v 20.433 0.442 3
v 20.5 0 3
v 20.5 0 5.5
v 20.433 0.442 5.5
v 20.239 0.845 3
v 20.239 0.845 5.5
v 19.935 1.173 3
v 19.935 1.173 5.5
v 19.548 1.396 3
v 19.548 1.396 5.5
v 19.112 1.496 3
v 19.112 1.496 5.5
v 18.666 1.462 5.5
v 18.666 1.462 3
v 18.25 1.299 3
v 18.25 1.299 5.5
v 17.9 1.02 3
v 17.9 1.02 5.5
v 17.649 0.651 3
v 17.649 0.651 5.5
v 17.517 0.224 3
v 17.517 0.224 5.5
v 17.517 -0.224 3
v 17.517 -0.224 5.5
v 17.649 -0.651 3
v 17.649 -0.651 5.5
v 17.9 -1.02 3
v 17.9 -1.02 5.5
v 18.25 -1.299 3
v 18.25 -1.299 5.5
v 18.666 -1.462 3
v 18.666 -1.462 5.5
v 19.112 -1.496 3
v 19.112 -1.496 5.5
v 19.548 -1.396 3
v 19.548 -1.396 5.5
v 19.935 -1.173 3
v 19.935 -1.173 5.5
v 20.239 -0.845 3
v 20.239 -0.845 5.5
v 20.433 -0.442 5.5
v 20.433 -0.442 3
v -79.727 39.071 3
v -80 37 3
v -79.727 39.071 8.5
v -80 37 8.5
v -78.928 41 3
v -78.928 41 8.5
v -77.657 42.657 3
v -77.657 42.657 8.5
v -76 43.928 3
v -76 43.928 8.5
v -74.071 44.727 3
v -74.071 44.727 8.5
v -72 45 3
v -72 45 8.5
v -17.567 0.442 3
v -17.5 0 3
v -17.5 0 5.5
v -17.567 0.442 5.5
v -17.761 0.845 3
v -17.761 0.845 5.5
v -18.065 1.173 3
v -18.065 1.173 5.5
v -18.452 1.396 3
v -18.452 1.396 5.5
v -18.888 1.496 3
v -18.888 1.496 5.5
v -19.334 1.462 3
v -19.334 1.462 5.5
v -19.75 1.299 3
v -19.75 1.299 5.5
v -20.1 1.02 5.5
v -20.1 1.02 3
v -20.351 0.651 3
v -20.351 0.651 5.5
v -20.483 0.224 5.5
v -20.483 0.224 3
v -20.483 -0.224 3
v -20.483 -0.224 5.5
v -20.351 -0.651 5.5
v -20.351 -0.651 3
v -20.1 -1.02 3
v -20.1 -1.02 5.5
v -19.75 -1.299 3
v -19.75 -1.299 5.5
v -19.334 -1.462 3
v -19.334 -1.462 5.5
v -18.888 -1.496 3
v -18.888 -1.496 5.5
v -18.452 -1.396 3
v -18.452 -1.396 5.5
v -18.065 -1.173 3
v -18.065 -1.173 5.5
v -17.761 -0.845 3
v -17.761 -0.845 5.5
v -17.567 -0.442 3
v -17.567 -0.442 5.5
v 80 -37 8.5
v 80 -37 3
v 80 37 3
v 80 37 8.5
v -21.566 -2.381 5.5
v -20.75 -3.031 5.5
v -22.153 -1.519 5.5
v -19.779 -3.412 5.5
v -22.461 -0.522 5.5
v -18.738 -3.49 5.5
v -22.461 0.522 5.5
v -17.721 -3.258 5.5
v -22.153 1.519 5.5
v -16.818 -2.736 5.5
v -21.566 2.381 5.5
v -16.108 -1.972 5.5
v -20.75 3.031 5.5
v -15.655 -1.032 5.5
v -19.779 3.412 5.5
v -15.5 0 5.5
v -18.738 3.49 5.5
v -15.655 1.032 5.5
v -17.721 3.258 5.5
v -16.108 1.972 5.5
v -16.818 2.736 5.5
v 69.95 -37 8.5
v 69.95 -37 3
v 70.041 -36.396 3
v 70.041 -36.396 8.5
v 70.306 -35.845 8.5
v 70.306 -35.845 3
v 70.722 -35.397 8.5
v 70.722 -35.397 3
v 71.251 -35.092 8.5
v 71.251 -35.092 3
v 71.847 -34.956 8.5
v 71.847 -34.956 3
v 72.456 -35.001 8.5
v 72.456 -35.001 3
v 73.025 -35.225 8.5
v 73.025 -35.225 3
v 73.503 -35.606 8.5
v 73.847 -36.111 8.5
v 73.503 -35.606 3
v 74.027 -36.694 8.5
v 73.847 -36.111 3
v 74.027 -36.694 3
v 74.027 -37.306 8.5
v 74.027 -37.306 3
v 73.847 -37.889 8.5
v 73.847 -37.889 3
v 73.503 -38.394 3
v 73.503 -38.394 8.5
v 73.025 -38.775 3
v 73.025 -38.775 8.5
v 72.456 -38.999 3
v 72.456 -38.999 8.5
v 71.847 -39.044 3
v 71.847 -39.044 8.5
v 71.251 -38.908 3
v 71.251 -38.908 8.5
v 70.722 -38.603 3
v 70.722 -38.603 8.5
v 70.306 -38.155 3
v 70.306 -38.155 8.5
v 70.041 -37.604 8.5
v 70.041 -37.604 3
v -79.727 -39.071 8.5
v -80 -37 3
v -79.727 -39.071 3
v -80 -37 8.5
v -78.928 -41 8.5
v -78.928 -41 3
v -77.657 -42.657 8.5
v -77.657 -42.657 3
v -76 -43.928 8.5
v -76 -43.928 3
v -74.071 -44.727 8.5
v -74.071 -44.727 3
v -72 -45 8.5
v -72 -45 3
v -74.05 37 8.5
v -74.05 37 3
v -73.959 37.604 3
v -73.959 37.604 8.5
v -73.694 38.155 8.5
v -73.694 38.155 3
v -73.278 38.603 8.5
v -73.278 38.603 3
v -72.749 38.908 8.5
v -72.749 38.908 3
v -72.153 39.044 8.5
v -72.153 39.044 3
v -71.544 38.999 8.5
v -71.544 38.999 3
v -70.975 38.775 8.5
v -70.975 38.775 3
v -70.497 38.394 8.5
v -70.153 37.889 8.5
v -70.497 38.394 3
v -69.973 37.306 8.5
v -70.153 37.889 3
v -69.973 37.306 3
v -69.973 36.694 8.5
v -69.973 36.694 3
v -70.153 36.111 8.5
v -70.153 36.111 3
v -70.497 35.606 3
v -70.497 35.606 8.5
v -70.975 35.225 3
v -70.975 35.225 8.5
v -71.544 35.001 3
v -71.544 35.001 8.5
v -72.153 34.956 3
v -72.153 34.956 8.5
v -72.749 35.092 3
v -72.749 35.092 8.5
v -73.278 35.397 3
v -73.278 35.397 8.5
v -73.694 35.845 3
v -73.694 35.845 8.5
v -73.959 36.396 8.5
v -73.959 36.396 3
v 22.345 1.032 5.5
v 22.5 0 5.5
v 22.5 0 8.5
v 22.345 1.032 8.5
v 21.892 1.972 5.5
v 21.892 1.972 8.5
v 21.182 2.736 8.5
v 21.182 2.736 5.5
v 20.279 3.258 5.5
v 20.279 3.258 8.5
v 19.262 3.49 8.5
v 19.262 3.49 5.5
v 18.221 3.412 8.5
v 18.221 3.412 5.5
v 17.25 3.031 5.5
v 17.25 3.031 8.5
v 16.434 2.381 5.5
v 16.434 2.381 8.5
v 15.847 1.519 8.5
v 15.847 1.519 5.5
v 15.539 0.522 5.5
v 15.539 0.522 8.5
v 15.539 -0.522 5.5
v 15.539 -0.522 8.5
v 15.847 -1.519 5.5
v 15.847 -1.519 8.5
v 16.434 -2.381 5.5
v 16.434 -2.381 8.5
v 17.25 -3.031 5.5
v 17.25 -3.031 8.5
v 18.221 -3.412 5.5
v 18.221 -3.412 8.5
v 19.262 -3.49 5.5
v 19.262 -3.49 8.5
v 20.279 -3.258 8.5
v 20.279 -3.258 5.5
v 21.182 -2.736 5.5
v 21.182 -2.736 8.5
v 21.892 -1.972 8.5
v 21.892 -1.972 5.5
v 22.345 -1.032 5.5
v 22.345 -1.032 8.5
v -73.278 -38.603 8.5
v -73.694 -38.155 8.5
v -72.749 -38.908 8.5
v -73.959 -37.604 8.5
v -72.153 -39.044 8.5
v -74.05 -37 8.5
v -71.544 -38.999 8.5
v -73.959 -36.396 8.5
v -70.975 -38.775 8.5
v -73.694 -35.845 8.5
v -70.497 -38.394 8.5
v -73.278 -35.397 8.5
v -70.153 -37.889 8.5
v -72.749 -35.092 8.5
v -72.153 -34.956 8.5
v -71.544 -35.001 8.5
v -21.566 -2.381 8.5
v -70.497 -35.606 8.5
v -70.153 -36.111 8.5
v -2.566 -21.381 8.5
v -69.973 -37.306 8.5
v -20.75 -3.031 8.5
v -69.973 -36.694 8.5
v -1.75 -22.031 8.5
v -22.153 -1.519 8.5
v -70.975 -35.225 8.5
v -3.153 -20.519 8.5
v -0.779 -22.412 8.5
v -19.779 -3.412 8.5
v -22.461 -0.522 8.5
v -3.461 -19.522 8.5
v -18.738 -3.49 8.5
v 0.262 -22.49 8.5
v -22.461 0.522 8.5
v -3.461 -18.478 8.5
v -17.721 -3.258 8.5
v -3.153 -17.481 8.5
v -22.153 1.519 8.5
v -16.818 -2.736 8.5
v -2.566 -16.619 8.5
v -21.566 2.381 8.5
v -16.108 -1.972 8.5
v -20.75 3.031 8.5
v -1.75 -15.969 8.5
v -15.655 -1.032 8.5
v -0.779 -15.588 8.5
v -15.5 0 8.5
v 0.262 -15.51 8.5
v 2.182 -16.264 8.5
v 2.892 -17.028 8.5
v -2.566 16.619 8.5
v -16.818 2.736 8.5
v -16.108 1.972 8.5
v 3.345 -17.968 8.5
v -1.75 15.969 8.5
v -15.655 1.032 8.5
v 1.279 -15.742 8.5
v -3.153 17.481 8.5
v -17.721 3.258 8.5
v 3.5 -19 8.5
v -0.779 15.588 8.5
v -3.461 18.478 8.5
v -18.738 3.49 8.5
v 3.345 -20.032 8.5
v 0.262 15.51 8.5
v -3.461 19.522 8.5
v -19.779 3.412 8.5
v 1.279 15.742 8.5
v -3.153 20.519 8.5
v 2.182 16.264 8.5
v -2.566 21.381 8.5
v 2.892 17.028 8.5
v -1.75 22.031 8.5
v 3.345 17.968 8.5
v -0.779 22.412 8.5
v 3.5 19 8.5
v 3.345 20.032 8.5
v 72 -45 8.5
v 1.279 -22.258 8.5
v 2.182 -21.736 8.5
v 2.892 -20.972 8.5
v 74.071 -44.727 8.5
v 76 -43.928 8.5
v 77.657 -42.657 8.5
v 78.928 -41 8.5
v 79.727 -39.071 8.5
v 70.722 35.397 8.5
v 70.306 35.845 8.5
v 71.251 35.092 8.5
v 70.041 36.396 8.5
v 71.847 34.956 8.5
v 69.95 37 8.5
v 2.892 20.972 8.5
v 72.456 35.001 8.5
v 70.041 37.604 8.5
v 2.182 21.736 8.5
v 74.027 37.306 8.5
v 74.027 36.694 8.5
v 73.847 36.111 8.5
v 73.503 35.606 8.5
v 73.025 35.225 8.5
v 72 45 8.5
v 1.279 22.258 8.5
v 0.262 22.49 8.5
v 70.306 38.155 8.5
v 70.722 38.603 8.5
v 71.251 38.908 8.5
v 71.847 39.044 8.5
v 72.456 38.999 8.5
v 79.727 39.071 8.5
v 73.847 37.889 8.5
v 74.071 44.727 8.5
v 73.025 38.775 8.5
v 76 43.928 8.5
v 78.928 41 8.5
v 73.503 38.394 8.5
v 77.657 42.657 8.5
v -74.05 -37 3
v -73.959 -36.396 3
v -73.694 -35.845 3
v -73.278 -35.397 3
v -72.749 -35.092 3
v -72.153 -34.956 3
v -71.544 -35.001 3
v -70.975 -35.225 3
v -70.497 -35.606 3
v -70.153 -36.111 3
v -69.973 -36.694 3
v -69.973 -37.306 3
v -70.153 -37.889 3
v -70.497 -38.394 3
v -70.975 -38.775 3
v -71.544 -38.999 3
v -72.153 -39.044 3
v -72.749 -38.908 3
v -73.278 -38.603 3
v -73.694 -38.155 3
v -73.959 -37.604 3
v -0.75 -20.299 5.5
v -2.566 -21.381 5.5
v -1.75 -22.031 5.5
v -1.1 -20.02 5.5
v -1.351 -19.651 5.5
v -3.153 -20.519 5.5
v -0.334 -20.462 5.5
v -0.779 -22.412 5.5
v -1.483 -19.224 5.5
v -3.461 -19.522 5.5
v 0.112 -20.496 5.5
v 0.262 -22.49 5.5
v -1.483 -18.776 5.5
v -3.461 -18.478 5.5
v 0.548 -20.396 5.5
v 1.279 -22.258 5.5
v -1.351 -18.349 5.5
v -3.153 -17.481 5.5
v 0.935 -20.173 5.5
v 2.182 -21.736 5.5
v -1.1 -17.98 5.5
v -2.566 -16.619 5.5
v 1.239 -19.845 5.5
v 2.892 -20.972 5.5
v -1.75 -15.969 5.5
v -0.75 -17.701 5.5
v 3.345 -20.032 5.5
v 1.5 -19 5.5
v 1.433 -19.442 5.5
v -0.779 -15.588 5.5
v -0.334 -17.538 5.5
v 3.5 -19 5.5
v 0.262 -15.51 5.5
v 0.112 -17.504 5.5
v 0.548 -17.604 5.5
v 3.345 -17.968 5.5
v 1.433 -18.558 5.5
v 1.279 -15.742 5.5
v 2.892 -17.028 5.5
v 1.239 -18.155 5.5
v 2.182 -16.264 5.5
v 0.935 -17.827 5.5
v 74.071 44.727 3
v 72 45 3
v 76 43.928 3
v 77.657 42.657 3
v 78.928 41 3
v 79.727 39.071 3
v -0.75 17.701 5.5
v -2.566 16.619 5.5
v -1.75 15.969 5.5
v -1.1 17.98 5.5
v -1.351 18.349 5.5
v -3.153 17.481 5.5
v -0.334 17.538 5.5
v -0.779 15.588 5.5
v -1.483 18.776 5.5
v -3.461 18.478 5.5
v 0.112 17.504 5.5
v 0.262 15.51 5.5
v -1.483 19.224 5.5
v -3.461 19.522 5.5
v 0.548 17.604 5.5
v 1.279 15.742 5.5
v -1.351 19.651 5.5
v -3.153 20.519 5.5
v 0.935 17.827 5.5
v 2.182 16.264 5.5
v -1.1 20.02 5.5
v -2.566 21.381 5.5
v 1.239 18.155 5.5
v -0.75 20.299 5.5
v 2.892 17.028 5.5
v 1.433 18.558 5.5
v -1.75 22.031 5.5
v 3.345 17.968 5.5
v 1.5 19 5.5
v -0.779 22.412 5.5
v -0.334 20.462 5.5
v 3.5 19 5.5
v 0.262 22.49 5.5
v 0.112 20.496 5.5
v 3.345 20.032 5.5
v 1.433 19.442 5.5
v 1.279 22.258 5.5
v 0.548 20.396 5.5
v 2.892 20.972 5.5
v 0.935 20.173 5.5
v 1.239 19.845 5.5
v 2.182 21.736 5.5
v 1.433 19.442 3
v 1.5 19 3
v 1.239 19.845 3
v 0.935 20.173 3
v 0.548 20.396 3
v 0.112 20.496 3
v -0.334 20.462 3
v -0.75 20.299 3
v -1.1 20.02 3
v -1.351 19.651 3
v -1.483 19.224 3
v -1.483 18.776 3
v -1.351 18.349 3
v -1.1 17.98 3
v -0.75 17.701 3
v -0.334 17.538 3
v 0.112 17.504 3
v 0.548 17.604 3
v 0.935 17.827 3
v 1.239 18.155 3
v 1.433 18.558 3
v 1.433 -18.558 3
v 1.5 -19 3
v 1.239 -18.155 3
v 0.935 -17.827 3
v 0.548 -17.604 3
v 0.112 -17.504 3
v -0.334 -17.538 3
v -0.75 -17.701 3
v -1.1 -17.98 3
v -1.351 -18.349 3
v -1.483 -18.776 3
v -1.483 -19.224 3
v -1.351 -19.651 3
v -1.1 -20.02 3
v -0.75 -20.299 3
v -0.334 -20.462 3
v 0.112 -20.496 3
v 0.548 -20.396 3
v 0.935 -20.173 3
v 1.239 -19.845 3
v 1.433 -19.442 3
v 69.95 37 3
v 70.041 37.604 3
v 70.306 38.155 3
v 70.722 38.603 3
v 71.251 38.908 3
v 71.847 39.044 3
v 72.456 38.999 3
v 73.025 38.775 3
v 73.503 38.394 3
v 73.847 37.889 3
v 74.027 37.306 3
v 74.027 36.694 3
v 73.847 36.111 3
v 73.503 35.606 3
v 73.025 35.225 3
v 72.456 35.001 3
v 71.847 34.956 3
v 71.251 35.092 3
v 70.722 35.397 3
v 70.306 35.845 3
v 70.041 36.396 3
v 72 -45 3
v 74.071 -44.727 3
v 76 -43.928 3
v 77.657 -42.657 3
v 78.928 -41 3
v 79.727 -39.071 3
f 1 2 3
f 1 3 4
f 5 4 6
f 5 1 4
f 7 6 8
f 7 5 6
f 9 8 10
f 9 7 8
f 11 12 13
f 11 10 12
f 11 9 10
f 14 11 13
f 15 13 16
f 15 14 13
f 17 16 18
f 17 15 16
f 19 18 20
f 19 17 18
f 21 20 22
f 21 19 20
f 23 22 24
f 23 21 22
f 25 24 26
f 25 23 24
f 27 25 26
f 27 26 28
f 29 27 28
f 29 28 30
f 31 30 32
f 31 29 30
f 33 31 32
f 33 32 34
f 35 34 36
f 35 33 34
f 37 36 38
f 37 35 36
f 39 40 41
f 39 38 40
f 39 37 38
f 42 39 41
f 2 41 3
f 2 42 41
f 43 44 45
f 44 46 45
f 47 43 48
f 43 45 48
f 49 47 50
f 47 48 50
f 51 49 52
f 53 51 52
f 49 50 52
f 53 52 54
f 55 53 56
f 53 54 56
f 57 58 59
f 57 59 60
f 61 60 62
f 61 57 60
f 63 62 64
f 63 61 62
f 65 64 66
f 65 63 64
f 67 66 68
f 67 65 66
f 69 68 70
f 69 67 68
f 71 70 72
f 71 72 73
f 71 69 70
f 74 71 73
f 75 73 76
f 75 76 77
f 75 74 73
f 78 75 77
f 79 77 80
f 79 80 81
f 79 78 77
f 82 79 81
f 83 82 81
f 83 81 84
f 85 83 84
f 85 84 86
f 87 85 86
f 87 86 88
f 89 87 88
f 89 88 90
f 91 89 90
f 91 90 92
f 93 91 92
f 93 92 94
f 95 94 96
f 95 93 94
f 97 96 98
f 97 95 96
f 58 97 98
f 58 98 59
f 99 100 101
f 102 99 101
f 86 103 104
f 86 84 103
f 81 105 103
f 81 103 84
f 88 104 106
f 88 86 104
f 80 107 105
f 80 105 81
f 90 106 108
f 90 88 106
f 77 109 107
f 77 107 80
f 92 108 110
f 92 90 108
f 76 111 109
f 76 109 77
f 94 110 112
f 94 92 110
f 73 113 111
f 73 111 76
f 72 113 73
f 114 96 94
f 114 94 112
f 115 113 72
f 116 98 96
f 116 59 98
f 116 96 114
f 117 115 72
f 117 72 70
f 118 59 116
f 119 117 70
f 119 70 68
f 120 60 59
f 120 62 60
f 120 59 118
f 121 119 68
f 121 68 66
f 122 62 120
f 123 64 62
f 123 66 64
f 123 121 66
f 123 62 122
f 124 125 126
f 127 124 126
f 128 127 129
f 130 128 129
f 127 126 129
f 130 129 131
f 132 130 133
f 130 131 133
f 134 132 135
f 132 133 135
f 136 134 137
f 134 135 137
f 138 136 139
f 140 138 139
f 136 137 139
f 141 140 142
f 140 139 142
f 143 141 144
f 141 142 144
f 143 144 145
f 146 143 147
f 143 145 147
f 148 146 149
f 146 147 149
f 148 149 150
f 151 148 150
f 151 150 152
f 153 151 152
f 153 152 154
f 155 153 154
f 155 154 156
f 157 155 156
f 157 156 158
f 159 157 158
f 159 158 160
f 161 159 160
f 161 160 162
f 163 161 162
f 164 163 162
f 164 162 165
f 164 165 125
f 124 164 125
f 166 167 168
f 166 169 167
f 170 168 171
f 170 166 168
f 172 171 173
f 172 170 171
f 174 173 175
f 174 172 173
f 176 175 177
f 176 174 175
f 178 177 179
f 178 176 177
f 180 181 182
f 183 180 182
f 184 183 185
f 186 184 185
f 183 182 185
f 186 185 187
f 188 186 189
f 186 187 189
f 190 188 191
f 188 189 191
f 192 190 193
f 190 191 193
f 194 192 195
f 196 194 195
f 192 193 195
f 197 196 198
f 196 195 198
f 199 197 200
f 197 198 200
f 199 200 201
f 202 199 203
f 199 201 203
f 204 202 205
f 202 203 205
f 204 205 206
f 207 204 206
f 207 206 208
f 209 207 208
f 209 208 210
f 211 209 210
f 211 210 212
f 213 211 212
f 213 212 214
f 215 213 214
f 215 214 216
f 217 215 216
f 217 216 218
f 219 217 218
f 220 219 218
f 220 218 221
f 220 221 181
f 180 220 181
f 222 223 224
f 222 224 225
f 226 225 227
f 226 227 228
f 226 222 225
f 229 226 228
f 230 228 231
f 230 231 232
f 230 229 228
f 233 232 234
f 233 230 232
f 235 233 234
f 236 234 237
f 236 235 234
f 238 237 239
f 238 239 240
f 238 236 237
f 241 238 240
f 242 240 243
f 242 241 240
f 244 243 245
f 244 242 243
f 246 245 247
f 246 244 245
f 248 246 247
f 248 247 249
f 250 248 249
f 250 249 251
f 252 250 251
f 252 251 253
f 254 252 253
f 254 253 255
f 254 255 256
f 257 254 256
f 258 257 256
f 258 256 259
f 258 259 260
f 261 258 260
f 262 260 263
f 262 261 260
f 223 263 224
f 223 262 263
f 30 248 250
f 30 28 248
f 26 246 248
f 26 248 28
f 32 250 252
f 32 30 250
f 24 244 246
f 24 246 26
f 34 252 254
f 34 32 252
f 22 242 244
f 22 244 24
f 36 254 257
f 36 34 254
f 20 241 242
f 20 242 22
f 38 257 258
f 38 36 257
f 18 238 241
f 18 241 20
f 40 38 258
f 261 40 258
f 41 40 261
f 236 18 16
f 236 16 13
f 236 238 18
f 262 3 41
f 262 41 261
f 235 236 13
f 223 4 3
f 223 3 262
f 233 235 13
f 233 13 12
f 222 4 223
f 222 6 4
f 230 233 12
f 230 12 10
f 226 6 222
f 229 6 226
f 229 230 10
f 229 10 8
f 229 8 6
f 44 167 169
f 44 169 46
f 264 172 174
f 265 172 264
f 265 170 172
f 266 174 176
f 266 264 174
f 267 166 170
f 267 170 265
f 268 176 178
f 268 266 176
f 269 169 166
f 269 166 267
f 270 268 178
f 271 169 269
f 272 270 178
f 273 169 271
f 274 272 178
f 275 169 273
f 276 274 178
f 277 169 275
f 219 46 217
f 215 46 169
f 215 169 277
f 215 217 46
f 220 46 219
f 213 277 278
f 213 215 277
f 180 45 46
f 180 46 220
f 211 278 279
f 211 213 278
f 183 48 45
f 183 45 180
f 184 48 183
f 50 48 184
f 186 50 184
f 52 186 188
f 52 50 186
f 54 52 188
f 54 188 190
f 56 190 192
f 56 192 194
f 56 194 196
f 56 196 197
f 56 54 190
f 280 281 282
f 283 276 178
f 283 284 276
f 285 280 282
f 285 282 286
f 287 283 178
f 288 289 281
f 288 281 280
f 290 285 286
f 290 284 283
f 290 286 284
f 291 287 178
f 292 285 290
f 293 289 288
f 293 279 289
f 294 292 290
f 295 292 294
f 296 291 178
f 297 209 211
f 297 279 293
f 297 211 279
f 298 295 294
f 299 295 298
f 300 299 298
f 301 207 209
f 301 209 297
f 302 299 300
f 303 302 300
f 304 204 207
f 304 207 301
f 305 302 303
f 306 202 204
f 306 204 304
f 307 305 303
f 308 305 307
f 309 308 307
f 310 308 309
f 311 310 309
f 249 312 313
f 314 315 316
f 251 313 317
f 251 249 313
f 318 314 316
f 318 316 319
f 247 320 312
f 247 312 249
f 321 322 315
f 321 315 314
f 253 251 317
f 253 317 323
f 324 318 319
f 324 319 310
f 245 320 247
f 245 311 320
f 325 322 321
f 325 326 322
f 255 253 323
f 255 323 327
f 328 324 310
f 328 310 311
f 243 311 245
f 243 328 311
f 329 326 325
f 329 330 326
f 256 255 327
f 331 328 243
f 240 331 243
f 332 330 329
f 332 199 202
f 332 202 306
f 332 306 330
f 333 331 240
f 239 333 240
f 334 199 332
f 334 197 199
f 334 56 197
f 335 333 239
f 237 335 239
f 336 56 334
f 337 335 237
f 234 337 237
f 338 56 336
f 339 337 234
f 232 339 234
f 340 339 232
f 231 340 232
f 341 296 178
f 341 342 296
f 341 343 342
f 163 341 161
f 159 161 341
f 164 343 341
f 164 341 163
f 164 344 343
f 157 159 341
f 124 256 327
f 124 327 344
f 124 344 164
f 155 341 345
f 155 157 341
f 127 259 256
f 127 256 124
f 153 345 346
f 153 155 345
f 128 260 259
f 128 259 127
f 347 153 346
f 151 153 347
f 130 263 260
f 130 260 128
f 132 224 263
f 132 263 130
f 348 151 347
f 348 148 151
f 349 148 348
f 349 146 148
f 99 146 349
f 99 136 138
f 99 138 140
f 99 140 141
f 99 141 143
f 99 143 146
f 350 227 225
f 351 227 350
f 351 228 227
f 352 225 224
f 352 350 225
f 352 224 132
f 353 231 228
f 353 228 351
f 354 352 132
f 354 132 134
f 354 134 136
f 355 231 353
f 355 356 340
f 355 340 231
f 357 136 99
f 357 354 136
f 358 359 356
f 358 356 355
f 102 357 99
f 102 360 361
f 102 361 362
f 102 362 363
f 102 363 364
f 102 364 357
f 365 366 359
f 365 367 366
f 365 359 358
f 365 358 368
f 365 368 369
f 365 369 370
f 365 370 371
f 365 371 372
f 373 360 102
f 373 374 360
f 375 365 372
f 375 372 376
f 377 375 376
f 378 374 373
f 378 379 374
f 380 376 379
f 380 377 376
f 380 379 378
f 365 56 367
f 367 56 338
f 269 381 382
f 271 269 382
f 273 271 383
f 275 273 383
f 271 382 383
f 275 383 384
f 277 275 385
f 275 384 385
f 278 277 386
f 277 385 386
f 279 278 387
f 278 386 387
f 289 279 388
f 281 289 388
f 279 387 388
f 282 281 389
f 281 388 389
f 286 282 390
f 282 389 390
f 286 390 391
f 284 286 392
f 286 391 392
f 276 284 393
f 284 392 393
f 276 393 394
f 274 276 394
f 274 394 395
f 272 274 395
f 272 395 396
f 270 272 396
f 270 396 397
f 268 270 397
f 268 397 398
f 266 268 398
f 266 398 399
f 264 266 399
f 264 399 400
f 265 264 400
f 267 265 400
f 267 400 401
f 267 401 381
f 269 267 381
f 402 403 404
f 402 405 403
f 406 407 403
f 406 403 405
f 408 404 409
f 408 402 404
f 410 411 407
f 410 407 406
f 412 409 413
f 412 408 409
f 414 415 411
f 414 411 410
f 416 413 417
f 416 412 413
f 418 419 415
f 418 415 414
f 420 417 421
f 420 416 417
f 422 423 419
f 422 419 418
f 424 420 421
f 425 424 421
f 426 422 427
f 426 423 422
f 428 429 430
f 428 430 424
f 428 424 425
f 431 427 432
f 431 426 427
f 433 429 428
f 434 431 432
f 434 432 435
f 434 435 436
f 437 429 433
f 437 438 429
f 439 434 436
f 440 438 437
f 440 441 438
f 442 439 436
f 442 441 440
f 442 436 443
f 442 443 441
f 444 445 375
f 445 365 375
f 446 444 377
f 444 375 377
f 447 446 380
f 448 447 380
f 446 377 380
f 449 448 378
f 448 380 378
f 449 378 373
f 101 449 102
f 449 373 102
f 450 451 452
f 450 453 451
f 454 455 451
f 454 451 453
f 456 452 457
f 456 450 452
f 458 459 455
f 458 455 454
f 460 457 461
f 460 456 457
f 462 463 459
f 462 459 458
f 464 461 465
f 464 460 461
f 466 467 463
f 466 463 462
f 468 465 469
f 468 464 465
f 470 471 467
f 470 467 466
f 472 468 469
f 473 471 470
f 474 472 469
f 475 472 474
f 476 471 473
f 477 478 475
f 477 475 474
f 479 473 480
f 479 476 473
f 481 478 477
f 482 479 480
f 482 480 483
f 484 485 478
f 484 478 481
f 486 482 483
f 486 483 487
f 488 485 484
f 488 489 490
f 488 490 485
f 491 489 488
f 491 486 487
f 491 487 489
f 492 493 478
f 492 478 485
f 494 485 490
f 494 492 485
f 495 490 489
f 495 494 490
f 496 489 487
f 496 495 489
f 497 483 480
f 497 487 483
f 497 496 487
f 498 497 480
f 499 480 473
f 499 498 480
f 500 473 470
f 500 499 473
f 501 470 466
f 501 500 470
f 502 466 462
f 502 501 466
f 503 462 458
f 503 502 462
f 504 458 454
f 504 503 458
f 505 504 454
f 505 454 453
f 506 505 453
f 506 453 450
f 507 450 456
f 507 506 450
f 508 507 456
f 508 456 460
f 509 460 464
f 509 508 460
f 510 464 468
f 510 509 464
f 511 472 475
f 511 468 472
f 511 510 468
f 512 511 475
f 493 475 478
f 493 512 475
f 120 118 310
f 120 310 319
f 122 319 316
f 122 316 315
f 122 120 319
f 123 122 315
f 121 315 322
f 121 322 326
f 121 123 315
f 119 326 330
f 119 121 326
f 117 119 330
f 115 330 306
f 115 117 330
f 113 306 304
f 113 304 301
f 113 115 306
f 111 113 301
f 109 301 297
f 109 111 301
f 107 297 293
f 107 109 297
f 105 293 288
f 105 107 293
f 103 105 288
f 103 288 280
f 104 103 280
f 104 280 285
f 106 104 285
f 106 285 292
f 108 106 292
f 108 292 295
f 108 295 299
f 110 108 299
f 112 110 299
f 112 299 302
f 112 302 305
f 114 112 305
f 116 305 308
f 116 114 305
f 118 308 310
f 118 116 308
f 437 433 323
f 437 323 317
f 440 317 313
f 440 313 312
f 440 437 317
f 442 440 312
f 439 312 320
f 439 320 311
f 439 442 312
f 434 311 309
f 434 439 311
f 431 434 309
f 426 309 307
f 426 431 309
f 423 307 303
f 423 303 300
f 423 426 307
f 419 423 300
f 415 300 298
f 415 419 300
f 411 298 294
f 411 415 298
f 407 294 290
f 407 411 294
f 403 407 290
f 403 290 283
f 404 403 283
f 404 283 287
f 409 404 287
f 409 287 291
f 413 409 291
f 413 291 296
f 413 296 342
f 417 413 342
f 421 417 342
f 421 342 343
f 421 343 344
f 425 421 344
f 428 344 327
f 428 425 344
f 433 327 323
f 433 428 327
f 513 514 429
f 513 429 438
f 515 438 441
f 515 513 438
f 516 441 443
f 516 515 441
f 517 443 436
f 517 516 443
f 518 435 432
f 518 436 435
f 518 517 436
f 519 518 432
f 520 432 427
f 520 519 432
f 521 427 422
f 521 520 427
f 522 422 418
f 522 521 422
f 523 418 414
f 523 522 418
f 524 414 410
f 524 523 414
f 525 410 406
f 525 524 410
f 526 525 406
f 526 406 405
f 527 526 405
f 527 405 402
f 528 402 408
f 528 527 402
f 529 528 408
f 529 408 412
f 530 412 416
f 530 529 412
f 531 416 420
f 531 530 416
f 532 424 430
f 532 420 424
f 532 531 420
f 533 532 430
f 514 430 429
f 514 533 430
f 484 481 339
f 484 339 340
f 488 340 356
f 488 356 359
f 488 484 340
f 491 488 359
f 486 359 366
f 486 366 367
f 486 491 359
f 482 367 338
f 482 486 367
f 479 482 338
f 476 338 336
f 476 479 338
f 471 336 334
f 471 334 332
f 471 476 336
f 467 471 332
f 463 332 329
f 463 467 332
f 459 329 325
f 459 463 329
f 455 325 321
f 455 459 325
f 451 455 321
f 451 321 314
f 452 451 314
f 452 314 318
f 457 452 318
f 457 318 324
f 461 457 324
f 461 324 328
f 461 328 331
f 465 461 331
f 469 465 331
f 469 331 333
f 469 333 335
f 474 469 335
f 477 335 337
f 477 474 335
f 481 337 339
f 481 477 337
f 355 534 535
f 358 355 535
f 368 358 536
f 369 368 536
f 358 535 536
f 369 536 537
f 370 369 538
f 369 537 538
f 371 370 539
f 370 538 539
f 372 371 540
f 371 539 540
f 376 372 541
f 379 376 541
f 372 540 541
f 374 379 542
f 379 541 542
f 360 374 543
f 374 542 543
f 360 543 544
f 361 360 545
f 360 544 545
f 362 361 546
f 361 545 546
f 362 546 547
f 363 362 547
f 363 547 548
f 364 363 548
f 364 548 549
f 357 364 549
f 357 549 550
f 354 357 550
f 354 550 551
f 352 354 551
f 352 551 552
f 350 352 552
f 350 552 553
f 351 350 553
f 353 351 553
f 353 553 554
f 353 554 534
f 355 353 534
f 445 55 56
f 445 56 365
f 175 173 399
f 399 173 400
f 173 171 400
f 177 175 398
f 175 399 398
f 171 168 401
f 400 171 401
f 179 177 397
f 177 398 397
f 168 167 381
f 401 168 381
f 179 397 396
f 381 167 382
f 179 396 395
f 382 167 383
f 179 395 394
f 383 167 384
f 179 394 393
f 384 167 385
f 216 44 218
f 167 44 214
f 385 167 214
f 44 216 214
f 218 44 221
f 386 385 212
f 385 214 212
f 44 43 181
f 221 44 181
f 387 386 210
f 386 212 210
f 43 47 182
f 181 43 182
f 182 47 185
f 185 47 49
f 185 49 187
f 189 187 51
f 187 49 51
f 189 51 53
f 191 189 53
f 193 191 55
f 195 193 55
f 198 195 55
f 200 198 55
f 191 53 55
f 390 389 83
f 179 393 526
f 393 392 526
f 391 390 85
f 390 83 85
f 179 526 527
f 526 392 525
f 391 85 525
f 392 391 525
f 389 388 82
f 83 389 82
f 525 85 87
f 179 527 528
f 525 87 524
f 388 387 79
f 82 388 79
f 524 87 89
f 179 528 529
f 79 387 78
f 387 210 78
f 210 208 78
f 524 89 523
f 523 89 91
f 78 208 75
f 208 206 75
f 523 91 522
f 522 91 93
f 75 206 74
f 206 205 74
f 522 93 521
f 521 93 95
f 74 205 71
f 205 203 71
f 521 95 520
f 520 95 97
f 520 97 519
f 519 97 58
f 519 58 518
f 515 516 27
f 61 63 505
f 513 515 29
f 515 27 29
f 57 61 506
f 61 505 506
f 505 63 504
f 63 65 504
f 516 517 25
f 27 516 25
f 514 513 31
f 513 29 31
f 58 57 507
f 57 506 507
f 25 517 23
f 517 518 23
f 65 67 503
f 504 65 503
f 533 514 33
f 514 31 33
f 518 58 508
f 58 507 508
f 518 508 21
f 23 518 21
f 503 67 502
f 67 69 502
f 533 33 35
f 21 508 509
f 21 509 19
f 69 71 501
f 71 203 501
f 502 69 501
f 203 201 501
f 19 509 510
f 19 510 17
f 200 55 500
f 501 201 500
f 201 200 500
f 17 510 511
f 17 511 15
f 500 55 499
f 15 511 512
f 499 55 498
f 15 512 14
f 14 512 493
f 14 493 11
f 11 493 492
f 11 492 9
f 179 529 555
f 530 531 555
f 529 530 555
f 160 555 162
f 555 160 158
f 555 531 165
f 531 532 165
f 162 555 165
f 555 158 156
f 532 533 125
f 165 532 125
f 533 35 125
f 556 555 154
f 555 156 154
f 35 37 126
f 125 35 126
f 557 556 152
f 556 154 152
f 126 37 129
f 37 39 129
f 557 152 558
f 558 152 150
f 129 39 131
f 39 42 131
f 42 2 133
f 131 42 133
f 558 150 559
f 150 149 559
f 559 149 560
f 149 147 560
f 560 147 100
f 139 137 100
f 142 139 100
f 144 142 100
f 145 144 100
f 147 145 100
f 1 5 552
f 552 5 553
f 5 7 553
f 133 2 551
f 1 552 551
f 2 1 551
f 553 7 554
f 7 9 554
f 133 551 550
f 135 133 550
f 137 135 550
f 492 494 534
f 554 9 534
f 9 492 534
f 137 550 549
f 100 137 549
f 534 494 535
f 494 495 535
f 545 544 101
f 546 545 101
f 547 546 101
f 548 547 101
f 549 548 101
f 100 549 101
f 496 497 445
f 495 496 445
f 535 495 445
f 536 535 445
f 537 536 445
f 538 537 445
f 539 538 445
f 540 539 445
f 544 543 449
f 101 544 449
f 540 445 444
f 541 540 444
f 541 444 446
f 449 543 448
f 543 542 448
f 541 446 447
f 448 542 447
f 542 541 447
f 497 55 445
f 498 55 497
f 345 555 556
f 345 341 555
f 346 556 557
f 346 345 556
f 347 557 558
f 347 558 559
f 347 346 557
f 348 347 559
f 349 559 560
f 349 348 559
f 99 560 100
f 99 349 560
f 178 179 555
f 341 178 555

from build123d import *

# Parameters (mm, degrees)
SKETCH_1_R          = 28.7
SKETCH_1_R_2        = 1.5
EXTRUDE_1_DEPTH     = 3
EXTRUDE_START       = -48
SKETCH_2_R          = 34.7
SKETCH_2_R_2        = 28.7
EXTRUDE_2_DEPTH     = 48
SKETCH_3_W          = 12
SKETCH_3_H          = 23
CUT_EXTRUDE_1_DEPTH = 10
FILLET_1_R          = 2
SKETCH_4_W          = 30
SKETCH_4_H          = 25
CUT_EXTRUDE_2_DEPTH = 96.094431221
FILLET_2_R          = 2
SKETCH_5_W          = 160
SKETCH_5_H          = 90
SKETCH_5_R          = 34.7
SKETCH_5_R_2        = 1.5
EXTRUDE_3_DEPTH     = 5.5
SKETCH_7_R          = 2.05
CUT_EXTRUDE_3_DEPTH = 104.580886314
FILLET_4_R          = 8
CUT_EXTRUDE_START   = -3
SKETCH_8_R          = 3.5
SKETCH_8_R_2        = 1.5
CUT_EXTRUDE_4_DEPTH = 3
SKETCH_9_R          = 34.7
CUT_EXTRUDE_5_DEPTH = 48


with BuildPart() as part:
    # 草图1 → 凸台-拉伸1 (new body)
    with BuildSketch(Plane.XY):
        Circle(SKETCH_1_R)
        with Locations((0, 19)):
            Circle(SKETCH_1_R_2, mode=Mode.SUBTRACT)
        with Locations((19, 0)):
            Circle(SKETCH_1_R_2, mode=Mode.SUBTRACT)
        with Locations((0, -19)):
            Circle(SKETCH_1_R_2, mode=Mode.SUBTRACT)
        with Locations((-19, 0)):
            Circle(SKETCH_1_R_2, mode=Mode.SUBTRACT)
    extrude(amount=EXTRUDE_1_DEPTH)

    # 草图2 → 凸台-拉伸2 (add)
    with BuildSketch(Plane.XY.offset(3).offset(EXTRUDE_START)):
        Circle(SKETCH_2_R)
        Circle(SKETCH_2_R_2, mode=Mode.SUBTRACT)
    extrude(amount=EXTRUDE_2_DEPTH)

    # 草图3 → 切除-拉伸1 (cut)
    with BuildSketch(Plane(origin=(-24.536605307, 24.536605307, 0), x_dir=(0, 0, 1), z_dir=(-0.7071067811865488, 0.7071067811865464, 0))):
        with Locations((-6, 0)):
            Rectangle(SKETCH_3_W, SKETCH_3_H)
    extrude(amount=-CUT_EXTRUDE_1_DEPTH, mode=Mode.SUBTRACT)

    # 圆角1
    fillet_1_edges = [part.edges().sort_by_distance(p)[0] for p in [
        (-12.740018652, 29.00347462, -12),
        (-12.740018652, 29.00347462, 0),
        (-29.00347462, 12.740018652, 0),
        (-29.00347462, 12.740018652, -12),
    ]]
    fillet(fillet_1_edges, radius=FILLET_1_R)

    # 草图4 → 切除-拉伸2 (cut, through all)
    with BuildSketch(Plane(origin=(24.536605307, 24.536605307, 0), x_dir=(0.7071067811865487, -0.7071067811865465, 0), z_dir=(0.7071067811865465, 0.7071067811865487, 0))):
        with Locations((0.808951296, 22.5)):
            Rectangle(SKETCH_4_W, SKETCH_4_H)
    extrude(amount=-CUT_EXTRUDE_2_DEPTH, mode=Mode.SUBTRACT)

    # 圆角2
    fillet_2_edges = [part.edges().sort_by_distance(p)[0] for p in [
        (-8.211322504, -30.568555834, -35),
        (30.568555834, 8.211322504, -35),
        (-8.211322504, -30.568555834, -10),
        (30.568555834, 8.211322504, -10),
        (-30.049784568, -9.980611027, -10),
        (9.980611027, 30.049784568, -10),
        (-30.049784568, -9.980611027, -35),
        (9.980611027, 30.049784568, -35),
    ]]
    fillet(fillet_2_edges, radius=FILLET_2_R)

    # 草图5 → 凸台-拉伸3 (add)
    # profile 1 of 2: a face of its own
    with BuildSketch(Plane.XY.offset(3)):
        Rectangle(SKETCH_5_W, SKETCH_5_H)
        Circle(SKETCH_5_R, mode=Mode.SUBTRACT)
    # profile 2 of 2: a face of its own
    with BuildSketch(Plane.XY.offset(3)):
        Circle(SKETCH_5_R)
        with Locations((0, 19)):
            Circle(SKETCH_5_R_2, mode=Mode.SUBTRACT)
        with Locations((-19, 0)):
            Circle(SKETCH_5_R_2, mode=Mode.SUBTRACT)
        with Locations((19, 0)):
            Circle(SKETCH_5_R_2, mode=Mode.SUBTRACT)
        with Locations((0, -19)):
            Circle(SKETCH_5_R_2, mode=Mode.SUBTRACT)
    extrude(amount=EXTRUDE_3_DEPTH)

    # 草图7 → 切除-拉伸3 (cut, through all)
    with BuildSketch(Plane(origin=(0, 0, 3), x_dir=(-1, 0, 0), z_dir=(0, 0, -1))):
        with Locations((-72, 37)):
            Circle(SKETCH_7_R)
        with Locations((72, 37)):
            Circle(SKETCH_7_R)
        with Locations((72, -37)):
            Circle(SKETCH_7_R)
        with Locations((-72, -37)):
            Circle(SKETCH_7_R)
    extrude(amount=-CUT_EXTRUDE_3_DEPTH, mode=Mode.SUBTRACT)

    # 圆角4
    fillet_4_edges = [part.edges().sort_by_distance(p)[0] for p in [
        (80, -45, 5.75),
        (80, 45, 5.75),
        (-80, 45, 5.75),
        (-80, -45, 5.75),
    ]]
    fillet(fillet_4_edges, radius=FILLET_4_R)

    # 草图8 → 切除-拉伸4 (cut)
    # profile 1 of 4: a face of its own
    with BuildSketch(Plane.XY.offset(8.5).offset(CUT_EXTRUDE_START)):
        with Locations((-19, 0)):
            Circle(SKETCH_8_R)
        with Locations((-19, 0)):
            Circle(SKETCH_8_R_2, mode=Mode.SUBTRACT)
    # profile 2 of 4: a face of its own
    with BuildSketch(Plane.XY.offset(8.5).offset(CUT_EXTRUDE_START)):
        with Locations((0, 19)):
            Circle(SKETCH_8_R)
    # profile 3 of 4: a face of its own
    with BuildSketch(Plane.XY.offset(8.5).offset(CUT_EXTRUDE_START)):
        with Locations((19, 0)):
            Circle(SKETCH_8_R)
    # profile 4 of 4: a face of its own
    with BuildSketch(Plane.XY.offset(8.5).offset(CUT_EXTRUDE_START)):
        with Locations((0, -19)):
            Circle(SKETCH_8_R)
    extrude(amount=CUT_EXTRUDE_4_DEPTH, mode=Mode.SUBTRACT)

    # 草图9 → 切除-拉伸5 (cut)
    with BuildSketch(Plane(origin=(0, 0, -45), x_dir=(-1, 0, 0), z_dir=(0, 0, -1))):
        Circle(SKETCH_9_R)
    extrude(amount=-CUT_EXTRUDE_5_DEPTH, mode=Mode.SUBTRACT)


solid = part.part
